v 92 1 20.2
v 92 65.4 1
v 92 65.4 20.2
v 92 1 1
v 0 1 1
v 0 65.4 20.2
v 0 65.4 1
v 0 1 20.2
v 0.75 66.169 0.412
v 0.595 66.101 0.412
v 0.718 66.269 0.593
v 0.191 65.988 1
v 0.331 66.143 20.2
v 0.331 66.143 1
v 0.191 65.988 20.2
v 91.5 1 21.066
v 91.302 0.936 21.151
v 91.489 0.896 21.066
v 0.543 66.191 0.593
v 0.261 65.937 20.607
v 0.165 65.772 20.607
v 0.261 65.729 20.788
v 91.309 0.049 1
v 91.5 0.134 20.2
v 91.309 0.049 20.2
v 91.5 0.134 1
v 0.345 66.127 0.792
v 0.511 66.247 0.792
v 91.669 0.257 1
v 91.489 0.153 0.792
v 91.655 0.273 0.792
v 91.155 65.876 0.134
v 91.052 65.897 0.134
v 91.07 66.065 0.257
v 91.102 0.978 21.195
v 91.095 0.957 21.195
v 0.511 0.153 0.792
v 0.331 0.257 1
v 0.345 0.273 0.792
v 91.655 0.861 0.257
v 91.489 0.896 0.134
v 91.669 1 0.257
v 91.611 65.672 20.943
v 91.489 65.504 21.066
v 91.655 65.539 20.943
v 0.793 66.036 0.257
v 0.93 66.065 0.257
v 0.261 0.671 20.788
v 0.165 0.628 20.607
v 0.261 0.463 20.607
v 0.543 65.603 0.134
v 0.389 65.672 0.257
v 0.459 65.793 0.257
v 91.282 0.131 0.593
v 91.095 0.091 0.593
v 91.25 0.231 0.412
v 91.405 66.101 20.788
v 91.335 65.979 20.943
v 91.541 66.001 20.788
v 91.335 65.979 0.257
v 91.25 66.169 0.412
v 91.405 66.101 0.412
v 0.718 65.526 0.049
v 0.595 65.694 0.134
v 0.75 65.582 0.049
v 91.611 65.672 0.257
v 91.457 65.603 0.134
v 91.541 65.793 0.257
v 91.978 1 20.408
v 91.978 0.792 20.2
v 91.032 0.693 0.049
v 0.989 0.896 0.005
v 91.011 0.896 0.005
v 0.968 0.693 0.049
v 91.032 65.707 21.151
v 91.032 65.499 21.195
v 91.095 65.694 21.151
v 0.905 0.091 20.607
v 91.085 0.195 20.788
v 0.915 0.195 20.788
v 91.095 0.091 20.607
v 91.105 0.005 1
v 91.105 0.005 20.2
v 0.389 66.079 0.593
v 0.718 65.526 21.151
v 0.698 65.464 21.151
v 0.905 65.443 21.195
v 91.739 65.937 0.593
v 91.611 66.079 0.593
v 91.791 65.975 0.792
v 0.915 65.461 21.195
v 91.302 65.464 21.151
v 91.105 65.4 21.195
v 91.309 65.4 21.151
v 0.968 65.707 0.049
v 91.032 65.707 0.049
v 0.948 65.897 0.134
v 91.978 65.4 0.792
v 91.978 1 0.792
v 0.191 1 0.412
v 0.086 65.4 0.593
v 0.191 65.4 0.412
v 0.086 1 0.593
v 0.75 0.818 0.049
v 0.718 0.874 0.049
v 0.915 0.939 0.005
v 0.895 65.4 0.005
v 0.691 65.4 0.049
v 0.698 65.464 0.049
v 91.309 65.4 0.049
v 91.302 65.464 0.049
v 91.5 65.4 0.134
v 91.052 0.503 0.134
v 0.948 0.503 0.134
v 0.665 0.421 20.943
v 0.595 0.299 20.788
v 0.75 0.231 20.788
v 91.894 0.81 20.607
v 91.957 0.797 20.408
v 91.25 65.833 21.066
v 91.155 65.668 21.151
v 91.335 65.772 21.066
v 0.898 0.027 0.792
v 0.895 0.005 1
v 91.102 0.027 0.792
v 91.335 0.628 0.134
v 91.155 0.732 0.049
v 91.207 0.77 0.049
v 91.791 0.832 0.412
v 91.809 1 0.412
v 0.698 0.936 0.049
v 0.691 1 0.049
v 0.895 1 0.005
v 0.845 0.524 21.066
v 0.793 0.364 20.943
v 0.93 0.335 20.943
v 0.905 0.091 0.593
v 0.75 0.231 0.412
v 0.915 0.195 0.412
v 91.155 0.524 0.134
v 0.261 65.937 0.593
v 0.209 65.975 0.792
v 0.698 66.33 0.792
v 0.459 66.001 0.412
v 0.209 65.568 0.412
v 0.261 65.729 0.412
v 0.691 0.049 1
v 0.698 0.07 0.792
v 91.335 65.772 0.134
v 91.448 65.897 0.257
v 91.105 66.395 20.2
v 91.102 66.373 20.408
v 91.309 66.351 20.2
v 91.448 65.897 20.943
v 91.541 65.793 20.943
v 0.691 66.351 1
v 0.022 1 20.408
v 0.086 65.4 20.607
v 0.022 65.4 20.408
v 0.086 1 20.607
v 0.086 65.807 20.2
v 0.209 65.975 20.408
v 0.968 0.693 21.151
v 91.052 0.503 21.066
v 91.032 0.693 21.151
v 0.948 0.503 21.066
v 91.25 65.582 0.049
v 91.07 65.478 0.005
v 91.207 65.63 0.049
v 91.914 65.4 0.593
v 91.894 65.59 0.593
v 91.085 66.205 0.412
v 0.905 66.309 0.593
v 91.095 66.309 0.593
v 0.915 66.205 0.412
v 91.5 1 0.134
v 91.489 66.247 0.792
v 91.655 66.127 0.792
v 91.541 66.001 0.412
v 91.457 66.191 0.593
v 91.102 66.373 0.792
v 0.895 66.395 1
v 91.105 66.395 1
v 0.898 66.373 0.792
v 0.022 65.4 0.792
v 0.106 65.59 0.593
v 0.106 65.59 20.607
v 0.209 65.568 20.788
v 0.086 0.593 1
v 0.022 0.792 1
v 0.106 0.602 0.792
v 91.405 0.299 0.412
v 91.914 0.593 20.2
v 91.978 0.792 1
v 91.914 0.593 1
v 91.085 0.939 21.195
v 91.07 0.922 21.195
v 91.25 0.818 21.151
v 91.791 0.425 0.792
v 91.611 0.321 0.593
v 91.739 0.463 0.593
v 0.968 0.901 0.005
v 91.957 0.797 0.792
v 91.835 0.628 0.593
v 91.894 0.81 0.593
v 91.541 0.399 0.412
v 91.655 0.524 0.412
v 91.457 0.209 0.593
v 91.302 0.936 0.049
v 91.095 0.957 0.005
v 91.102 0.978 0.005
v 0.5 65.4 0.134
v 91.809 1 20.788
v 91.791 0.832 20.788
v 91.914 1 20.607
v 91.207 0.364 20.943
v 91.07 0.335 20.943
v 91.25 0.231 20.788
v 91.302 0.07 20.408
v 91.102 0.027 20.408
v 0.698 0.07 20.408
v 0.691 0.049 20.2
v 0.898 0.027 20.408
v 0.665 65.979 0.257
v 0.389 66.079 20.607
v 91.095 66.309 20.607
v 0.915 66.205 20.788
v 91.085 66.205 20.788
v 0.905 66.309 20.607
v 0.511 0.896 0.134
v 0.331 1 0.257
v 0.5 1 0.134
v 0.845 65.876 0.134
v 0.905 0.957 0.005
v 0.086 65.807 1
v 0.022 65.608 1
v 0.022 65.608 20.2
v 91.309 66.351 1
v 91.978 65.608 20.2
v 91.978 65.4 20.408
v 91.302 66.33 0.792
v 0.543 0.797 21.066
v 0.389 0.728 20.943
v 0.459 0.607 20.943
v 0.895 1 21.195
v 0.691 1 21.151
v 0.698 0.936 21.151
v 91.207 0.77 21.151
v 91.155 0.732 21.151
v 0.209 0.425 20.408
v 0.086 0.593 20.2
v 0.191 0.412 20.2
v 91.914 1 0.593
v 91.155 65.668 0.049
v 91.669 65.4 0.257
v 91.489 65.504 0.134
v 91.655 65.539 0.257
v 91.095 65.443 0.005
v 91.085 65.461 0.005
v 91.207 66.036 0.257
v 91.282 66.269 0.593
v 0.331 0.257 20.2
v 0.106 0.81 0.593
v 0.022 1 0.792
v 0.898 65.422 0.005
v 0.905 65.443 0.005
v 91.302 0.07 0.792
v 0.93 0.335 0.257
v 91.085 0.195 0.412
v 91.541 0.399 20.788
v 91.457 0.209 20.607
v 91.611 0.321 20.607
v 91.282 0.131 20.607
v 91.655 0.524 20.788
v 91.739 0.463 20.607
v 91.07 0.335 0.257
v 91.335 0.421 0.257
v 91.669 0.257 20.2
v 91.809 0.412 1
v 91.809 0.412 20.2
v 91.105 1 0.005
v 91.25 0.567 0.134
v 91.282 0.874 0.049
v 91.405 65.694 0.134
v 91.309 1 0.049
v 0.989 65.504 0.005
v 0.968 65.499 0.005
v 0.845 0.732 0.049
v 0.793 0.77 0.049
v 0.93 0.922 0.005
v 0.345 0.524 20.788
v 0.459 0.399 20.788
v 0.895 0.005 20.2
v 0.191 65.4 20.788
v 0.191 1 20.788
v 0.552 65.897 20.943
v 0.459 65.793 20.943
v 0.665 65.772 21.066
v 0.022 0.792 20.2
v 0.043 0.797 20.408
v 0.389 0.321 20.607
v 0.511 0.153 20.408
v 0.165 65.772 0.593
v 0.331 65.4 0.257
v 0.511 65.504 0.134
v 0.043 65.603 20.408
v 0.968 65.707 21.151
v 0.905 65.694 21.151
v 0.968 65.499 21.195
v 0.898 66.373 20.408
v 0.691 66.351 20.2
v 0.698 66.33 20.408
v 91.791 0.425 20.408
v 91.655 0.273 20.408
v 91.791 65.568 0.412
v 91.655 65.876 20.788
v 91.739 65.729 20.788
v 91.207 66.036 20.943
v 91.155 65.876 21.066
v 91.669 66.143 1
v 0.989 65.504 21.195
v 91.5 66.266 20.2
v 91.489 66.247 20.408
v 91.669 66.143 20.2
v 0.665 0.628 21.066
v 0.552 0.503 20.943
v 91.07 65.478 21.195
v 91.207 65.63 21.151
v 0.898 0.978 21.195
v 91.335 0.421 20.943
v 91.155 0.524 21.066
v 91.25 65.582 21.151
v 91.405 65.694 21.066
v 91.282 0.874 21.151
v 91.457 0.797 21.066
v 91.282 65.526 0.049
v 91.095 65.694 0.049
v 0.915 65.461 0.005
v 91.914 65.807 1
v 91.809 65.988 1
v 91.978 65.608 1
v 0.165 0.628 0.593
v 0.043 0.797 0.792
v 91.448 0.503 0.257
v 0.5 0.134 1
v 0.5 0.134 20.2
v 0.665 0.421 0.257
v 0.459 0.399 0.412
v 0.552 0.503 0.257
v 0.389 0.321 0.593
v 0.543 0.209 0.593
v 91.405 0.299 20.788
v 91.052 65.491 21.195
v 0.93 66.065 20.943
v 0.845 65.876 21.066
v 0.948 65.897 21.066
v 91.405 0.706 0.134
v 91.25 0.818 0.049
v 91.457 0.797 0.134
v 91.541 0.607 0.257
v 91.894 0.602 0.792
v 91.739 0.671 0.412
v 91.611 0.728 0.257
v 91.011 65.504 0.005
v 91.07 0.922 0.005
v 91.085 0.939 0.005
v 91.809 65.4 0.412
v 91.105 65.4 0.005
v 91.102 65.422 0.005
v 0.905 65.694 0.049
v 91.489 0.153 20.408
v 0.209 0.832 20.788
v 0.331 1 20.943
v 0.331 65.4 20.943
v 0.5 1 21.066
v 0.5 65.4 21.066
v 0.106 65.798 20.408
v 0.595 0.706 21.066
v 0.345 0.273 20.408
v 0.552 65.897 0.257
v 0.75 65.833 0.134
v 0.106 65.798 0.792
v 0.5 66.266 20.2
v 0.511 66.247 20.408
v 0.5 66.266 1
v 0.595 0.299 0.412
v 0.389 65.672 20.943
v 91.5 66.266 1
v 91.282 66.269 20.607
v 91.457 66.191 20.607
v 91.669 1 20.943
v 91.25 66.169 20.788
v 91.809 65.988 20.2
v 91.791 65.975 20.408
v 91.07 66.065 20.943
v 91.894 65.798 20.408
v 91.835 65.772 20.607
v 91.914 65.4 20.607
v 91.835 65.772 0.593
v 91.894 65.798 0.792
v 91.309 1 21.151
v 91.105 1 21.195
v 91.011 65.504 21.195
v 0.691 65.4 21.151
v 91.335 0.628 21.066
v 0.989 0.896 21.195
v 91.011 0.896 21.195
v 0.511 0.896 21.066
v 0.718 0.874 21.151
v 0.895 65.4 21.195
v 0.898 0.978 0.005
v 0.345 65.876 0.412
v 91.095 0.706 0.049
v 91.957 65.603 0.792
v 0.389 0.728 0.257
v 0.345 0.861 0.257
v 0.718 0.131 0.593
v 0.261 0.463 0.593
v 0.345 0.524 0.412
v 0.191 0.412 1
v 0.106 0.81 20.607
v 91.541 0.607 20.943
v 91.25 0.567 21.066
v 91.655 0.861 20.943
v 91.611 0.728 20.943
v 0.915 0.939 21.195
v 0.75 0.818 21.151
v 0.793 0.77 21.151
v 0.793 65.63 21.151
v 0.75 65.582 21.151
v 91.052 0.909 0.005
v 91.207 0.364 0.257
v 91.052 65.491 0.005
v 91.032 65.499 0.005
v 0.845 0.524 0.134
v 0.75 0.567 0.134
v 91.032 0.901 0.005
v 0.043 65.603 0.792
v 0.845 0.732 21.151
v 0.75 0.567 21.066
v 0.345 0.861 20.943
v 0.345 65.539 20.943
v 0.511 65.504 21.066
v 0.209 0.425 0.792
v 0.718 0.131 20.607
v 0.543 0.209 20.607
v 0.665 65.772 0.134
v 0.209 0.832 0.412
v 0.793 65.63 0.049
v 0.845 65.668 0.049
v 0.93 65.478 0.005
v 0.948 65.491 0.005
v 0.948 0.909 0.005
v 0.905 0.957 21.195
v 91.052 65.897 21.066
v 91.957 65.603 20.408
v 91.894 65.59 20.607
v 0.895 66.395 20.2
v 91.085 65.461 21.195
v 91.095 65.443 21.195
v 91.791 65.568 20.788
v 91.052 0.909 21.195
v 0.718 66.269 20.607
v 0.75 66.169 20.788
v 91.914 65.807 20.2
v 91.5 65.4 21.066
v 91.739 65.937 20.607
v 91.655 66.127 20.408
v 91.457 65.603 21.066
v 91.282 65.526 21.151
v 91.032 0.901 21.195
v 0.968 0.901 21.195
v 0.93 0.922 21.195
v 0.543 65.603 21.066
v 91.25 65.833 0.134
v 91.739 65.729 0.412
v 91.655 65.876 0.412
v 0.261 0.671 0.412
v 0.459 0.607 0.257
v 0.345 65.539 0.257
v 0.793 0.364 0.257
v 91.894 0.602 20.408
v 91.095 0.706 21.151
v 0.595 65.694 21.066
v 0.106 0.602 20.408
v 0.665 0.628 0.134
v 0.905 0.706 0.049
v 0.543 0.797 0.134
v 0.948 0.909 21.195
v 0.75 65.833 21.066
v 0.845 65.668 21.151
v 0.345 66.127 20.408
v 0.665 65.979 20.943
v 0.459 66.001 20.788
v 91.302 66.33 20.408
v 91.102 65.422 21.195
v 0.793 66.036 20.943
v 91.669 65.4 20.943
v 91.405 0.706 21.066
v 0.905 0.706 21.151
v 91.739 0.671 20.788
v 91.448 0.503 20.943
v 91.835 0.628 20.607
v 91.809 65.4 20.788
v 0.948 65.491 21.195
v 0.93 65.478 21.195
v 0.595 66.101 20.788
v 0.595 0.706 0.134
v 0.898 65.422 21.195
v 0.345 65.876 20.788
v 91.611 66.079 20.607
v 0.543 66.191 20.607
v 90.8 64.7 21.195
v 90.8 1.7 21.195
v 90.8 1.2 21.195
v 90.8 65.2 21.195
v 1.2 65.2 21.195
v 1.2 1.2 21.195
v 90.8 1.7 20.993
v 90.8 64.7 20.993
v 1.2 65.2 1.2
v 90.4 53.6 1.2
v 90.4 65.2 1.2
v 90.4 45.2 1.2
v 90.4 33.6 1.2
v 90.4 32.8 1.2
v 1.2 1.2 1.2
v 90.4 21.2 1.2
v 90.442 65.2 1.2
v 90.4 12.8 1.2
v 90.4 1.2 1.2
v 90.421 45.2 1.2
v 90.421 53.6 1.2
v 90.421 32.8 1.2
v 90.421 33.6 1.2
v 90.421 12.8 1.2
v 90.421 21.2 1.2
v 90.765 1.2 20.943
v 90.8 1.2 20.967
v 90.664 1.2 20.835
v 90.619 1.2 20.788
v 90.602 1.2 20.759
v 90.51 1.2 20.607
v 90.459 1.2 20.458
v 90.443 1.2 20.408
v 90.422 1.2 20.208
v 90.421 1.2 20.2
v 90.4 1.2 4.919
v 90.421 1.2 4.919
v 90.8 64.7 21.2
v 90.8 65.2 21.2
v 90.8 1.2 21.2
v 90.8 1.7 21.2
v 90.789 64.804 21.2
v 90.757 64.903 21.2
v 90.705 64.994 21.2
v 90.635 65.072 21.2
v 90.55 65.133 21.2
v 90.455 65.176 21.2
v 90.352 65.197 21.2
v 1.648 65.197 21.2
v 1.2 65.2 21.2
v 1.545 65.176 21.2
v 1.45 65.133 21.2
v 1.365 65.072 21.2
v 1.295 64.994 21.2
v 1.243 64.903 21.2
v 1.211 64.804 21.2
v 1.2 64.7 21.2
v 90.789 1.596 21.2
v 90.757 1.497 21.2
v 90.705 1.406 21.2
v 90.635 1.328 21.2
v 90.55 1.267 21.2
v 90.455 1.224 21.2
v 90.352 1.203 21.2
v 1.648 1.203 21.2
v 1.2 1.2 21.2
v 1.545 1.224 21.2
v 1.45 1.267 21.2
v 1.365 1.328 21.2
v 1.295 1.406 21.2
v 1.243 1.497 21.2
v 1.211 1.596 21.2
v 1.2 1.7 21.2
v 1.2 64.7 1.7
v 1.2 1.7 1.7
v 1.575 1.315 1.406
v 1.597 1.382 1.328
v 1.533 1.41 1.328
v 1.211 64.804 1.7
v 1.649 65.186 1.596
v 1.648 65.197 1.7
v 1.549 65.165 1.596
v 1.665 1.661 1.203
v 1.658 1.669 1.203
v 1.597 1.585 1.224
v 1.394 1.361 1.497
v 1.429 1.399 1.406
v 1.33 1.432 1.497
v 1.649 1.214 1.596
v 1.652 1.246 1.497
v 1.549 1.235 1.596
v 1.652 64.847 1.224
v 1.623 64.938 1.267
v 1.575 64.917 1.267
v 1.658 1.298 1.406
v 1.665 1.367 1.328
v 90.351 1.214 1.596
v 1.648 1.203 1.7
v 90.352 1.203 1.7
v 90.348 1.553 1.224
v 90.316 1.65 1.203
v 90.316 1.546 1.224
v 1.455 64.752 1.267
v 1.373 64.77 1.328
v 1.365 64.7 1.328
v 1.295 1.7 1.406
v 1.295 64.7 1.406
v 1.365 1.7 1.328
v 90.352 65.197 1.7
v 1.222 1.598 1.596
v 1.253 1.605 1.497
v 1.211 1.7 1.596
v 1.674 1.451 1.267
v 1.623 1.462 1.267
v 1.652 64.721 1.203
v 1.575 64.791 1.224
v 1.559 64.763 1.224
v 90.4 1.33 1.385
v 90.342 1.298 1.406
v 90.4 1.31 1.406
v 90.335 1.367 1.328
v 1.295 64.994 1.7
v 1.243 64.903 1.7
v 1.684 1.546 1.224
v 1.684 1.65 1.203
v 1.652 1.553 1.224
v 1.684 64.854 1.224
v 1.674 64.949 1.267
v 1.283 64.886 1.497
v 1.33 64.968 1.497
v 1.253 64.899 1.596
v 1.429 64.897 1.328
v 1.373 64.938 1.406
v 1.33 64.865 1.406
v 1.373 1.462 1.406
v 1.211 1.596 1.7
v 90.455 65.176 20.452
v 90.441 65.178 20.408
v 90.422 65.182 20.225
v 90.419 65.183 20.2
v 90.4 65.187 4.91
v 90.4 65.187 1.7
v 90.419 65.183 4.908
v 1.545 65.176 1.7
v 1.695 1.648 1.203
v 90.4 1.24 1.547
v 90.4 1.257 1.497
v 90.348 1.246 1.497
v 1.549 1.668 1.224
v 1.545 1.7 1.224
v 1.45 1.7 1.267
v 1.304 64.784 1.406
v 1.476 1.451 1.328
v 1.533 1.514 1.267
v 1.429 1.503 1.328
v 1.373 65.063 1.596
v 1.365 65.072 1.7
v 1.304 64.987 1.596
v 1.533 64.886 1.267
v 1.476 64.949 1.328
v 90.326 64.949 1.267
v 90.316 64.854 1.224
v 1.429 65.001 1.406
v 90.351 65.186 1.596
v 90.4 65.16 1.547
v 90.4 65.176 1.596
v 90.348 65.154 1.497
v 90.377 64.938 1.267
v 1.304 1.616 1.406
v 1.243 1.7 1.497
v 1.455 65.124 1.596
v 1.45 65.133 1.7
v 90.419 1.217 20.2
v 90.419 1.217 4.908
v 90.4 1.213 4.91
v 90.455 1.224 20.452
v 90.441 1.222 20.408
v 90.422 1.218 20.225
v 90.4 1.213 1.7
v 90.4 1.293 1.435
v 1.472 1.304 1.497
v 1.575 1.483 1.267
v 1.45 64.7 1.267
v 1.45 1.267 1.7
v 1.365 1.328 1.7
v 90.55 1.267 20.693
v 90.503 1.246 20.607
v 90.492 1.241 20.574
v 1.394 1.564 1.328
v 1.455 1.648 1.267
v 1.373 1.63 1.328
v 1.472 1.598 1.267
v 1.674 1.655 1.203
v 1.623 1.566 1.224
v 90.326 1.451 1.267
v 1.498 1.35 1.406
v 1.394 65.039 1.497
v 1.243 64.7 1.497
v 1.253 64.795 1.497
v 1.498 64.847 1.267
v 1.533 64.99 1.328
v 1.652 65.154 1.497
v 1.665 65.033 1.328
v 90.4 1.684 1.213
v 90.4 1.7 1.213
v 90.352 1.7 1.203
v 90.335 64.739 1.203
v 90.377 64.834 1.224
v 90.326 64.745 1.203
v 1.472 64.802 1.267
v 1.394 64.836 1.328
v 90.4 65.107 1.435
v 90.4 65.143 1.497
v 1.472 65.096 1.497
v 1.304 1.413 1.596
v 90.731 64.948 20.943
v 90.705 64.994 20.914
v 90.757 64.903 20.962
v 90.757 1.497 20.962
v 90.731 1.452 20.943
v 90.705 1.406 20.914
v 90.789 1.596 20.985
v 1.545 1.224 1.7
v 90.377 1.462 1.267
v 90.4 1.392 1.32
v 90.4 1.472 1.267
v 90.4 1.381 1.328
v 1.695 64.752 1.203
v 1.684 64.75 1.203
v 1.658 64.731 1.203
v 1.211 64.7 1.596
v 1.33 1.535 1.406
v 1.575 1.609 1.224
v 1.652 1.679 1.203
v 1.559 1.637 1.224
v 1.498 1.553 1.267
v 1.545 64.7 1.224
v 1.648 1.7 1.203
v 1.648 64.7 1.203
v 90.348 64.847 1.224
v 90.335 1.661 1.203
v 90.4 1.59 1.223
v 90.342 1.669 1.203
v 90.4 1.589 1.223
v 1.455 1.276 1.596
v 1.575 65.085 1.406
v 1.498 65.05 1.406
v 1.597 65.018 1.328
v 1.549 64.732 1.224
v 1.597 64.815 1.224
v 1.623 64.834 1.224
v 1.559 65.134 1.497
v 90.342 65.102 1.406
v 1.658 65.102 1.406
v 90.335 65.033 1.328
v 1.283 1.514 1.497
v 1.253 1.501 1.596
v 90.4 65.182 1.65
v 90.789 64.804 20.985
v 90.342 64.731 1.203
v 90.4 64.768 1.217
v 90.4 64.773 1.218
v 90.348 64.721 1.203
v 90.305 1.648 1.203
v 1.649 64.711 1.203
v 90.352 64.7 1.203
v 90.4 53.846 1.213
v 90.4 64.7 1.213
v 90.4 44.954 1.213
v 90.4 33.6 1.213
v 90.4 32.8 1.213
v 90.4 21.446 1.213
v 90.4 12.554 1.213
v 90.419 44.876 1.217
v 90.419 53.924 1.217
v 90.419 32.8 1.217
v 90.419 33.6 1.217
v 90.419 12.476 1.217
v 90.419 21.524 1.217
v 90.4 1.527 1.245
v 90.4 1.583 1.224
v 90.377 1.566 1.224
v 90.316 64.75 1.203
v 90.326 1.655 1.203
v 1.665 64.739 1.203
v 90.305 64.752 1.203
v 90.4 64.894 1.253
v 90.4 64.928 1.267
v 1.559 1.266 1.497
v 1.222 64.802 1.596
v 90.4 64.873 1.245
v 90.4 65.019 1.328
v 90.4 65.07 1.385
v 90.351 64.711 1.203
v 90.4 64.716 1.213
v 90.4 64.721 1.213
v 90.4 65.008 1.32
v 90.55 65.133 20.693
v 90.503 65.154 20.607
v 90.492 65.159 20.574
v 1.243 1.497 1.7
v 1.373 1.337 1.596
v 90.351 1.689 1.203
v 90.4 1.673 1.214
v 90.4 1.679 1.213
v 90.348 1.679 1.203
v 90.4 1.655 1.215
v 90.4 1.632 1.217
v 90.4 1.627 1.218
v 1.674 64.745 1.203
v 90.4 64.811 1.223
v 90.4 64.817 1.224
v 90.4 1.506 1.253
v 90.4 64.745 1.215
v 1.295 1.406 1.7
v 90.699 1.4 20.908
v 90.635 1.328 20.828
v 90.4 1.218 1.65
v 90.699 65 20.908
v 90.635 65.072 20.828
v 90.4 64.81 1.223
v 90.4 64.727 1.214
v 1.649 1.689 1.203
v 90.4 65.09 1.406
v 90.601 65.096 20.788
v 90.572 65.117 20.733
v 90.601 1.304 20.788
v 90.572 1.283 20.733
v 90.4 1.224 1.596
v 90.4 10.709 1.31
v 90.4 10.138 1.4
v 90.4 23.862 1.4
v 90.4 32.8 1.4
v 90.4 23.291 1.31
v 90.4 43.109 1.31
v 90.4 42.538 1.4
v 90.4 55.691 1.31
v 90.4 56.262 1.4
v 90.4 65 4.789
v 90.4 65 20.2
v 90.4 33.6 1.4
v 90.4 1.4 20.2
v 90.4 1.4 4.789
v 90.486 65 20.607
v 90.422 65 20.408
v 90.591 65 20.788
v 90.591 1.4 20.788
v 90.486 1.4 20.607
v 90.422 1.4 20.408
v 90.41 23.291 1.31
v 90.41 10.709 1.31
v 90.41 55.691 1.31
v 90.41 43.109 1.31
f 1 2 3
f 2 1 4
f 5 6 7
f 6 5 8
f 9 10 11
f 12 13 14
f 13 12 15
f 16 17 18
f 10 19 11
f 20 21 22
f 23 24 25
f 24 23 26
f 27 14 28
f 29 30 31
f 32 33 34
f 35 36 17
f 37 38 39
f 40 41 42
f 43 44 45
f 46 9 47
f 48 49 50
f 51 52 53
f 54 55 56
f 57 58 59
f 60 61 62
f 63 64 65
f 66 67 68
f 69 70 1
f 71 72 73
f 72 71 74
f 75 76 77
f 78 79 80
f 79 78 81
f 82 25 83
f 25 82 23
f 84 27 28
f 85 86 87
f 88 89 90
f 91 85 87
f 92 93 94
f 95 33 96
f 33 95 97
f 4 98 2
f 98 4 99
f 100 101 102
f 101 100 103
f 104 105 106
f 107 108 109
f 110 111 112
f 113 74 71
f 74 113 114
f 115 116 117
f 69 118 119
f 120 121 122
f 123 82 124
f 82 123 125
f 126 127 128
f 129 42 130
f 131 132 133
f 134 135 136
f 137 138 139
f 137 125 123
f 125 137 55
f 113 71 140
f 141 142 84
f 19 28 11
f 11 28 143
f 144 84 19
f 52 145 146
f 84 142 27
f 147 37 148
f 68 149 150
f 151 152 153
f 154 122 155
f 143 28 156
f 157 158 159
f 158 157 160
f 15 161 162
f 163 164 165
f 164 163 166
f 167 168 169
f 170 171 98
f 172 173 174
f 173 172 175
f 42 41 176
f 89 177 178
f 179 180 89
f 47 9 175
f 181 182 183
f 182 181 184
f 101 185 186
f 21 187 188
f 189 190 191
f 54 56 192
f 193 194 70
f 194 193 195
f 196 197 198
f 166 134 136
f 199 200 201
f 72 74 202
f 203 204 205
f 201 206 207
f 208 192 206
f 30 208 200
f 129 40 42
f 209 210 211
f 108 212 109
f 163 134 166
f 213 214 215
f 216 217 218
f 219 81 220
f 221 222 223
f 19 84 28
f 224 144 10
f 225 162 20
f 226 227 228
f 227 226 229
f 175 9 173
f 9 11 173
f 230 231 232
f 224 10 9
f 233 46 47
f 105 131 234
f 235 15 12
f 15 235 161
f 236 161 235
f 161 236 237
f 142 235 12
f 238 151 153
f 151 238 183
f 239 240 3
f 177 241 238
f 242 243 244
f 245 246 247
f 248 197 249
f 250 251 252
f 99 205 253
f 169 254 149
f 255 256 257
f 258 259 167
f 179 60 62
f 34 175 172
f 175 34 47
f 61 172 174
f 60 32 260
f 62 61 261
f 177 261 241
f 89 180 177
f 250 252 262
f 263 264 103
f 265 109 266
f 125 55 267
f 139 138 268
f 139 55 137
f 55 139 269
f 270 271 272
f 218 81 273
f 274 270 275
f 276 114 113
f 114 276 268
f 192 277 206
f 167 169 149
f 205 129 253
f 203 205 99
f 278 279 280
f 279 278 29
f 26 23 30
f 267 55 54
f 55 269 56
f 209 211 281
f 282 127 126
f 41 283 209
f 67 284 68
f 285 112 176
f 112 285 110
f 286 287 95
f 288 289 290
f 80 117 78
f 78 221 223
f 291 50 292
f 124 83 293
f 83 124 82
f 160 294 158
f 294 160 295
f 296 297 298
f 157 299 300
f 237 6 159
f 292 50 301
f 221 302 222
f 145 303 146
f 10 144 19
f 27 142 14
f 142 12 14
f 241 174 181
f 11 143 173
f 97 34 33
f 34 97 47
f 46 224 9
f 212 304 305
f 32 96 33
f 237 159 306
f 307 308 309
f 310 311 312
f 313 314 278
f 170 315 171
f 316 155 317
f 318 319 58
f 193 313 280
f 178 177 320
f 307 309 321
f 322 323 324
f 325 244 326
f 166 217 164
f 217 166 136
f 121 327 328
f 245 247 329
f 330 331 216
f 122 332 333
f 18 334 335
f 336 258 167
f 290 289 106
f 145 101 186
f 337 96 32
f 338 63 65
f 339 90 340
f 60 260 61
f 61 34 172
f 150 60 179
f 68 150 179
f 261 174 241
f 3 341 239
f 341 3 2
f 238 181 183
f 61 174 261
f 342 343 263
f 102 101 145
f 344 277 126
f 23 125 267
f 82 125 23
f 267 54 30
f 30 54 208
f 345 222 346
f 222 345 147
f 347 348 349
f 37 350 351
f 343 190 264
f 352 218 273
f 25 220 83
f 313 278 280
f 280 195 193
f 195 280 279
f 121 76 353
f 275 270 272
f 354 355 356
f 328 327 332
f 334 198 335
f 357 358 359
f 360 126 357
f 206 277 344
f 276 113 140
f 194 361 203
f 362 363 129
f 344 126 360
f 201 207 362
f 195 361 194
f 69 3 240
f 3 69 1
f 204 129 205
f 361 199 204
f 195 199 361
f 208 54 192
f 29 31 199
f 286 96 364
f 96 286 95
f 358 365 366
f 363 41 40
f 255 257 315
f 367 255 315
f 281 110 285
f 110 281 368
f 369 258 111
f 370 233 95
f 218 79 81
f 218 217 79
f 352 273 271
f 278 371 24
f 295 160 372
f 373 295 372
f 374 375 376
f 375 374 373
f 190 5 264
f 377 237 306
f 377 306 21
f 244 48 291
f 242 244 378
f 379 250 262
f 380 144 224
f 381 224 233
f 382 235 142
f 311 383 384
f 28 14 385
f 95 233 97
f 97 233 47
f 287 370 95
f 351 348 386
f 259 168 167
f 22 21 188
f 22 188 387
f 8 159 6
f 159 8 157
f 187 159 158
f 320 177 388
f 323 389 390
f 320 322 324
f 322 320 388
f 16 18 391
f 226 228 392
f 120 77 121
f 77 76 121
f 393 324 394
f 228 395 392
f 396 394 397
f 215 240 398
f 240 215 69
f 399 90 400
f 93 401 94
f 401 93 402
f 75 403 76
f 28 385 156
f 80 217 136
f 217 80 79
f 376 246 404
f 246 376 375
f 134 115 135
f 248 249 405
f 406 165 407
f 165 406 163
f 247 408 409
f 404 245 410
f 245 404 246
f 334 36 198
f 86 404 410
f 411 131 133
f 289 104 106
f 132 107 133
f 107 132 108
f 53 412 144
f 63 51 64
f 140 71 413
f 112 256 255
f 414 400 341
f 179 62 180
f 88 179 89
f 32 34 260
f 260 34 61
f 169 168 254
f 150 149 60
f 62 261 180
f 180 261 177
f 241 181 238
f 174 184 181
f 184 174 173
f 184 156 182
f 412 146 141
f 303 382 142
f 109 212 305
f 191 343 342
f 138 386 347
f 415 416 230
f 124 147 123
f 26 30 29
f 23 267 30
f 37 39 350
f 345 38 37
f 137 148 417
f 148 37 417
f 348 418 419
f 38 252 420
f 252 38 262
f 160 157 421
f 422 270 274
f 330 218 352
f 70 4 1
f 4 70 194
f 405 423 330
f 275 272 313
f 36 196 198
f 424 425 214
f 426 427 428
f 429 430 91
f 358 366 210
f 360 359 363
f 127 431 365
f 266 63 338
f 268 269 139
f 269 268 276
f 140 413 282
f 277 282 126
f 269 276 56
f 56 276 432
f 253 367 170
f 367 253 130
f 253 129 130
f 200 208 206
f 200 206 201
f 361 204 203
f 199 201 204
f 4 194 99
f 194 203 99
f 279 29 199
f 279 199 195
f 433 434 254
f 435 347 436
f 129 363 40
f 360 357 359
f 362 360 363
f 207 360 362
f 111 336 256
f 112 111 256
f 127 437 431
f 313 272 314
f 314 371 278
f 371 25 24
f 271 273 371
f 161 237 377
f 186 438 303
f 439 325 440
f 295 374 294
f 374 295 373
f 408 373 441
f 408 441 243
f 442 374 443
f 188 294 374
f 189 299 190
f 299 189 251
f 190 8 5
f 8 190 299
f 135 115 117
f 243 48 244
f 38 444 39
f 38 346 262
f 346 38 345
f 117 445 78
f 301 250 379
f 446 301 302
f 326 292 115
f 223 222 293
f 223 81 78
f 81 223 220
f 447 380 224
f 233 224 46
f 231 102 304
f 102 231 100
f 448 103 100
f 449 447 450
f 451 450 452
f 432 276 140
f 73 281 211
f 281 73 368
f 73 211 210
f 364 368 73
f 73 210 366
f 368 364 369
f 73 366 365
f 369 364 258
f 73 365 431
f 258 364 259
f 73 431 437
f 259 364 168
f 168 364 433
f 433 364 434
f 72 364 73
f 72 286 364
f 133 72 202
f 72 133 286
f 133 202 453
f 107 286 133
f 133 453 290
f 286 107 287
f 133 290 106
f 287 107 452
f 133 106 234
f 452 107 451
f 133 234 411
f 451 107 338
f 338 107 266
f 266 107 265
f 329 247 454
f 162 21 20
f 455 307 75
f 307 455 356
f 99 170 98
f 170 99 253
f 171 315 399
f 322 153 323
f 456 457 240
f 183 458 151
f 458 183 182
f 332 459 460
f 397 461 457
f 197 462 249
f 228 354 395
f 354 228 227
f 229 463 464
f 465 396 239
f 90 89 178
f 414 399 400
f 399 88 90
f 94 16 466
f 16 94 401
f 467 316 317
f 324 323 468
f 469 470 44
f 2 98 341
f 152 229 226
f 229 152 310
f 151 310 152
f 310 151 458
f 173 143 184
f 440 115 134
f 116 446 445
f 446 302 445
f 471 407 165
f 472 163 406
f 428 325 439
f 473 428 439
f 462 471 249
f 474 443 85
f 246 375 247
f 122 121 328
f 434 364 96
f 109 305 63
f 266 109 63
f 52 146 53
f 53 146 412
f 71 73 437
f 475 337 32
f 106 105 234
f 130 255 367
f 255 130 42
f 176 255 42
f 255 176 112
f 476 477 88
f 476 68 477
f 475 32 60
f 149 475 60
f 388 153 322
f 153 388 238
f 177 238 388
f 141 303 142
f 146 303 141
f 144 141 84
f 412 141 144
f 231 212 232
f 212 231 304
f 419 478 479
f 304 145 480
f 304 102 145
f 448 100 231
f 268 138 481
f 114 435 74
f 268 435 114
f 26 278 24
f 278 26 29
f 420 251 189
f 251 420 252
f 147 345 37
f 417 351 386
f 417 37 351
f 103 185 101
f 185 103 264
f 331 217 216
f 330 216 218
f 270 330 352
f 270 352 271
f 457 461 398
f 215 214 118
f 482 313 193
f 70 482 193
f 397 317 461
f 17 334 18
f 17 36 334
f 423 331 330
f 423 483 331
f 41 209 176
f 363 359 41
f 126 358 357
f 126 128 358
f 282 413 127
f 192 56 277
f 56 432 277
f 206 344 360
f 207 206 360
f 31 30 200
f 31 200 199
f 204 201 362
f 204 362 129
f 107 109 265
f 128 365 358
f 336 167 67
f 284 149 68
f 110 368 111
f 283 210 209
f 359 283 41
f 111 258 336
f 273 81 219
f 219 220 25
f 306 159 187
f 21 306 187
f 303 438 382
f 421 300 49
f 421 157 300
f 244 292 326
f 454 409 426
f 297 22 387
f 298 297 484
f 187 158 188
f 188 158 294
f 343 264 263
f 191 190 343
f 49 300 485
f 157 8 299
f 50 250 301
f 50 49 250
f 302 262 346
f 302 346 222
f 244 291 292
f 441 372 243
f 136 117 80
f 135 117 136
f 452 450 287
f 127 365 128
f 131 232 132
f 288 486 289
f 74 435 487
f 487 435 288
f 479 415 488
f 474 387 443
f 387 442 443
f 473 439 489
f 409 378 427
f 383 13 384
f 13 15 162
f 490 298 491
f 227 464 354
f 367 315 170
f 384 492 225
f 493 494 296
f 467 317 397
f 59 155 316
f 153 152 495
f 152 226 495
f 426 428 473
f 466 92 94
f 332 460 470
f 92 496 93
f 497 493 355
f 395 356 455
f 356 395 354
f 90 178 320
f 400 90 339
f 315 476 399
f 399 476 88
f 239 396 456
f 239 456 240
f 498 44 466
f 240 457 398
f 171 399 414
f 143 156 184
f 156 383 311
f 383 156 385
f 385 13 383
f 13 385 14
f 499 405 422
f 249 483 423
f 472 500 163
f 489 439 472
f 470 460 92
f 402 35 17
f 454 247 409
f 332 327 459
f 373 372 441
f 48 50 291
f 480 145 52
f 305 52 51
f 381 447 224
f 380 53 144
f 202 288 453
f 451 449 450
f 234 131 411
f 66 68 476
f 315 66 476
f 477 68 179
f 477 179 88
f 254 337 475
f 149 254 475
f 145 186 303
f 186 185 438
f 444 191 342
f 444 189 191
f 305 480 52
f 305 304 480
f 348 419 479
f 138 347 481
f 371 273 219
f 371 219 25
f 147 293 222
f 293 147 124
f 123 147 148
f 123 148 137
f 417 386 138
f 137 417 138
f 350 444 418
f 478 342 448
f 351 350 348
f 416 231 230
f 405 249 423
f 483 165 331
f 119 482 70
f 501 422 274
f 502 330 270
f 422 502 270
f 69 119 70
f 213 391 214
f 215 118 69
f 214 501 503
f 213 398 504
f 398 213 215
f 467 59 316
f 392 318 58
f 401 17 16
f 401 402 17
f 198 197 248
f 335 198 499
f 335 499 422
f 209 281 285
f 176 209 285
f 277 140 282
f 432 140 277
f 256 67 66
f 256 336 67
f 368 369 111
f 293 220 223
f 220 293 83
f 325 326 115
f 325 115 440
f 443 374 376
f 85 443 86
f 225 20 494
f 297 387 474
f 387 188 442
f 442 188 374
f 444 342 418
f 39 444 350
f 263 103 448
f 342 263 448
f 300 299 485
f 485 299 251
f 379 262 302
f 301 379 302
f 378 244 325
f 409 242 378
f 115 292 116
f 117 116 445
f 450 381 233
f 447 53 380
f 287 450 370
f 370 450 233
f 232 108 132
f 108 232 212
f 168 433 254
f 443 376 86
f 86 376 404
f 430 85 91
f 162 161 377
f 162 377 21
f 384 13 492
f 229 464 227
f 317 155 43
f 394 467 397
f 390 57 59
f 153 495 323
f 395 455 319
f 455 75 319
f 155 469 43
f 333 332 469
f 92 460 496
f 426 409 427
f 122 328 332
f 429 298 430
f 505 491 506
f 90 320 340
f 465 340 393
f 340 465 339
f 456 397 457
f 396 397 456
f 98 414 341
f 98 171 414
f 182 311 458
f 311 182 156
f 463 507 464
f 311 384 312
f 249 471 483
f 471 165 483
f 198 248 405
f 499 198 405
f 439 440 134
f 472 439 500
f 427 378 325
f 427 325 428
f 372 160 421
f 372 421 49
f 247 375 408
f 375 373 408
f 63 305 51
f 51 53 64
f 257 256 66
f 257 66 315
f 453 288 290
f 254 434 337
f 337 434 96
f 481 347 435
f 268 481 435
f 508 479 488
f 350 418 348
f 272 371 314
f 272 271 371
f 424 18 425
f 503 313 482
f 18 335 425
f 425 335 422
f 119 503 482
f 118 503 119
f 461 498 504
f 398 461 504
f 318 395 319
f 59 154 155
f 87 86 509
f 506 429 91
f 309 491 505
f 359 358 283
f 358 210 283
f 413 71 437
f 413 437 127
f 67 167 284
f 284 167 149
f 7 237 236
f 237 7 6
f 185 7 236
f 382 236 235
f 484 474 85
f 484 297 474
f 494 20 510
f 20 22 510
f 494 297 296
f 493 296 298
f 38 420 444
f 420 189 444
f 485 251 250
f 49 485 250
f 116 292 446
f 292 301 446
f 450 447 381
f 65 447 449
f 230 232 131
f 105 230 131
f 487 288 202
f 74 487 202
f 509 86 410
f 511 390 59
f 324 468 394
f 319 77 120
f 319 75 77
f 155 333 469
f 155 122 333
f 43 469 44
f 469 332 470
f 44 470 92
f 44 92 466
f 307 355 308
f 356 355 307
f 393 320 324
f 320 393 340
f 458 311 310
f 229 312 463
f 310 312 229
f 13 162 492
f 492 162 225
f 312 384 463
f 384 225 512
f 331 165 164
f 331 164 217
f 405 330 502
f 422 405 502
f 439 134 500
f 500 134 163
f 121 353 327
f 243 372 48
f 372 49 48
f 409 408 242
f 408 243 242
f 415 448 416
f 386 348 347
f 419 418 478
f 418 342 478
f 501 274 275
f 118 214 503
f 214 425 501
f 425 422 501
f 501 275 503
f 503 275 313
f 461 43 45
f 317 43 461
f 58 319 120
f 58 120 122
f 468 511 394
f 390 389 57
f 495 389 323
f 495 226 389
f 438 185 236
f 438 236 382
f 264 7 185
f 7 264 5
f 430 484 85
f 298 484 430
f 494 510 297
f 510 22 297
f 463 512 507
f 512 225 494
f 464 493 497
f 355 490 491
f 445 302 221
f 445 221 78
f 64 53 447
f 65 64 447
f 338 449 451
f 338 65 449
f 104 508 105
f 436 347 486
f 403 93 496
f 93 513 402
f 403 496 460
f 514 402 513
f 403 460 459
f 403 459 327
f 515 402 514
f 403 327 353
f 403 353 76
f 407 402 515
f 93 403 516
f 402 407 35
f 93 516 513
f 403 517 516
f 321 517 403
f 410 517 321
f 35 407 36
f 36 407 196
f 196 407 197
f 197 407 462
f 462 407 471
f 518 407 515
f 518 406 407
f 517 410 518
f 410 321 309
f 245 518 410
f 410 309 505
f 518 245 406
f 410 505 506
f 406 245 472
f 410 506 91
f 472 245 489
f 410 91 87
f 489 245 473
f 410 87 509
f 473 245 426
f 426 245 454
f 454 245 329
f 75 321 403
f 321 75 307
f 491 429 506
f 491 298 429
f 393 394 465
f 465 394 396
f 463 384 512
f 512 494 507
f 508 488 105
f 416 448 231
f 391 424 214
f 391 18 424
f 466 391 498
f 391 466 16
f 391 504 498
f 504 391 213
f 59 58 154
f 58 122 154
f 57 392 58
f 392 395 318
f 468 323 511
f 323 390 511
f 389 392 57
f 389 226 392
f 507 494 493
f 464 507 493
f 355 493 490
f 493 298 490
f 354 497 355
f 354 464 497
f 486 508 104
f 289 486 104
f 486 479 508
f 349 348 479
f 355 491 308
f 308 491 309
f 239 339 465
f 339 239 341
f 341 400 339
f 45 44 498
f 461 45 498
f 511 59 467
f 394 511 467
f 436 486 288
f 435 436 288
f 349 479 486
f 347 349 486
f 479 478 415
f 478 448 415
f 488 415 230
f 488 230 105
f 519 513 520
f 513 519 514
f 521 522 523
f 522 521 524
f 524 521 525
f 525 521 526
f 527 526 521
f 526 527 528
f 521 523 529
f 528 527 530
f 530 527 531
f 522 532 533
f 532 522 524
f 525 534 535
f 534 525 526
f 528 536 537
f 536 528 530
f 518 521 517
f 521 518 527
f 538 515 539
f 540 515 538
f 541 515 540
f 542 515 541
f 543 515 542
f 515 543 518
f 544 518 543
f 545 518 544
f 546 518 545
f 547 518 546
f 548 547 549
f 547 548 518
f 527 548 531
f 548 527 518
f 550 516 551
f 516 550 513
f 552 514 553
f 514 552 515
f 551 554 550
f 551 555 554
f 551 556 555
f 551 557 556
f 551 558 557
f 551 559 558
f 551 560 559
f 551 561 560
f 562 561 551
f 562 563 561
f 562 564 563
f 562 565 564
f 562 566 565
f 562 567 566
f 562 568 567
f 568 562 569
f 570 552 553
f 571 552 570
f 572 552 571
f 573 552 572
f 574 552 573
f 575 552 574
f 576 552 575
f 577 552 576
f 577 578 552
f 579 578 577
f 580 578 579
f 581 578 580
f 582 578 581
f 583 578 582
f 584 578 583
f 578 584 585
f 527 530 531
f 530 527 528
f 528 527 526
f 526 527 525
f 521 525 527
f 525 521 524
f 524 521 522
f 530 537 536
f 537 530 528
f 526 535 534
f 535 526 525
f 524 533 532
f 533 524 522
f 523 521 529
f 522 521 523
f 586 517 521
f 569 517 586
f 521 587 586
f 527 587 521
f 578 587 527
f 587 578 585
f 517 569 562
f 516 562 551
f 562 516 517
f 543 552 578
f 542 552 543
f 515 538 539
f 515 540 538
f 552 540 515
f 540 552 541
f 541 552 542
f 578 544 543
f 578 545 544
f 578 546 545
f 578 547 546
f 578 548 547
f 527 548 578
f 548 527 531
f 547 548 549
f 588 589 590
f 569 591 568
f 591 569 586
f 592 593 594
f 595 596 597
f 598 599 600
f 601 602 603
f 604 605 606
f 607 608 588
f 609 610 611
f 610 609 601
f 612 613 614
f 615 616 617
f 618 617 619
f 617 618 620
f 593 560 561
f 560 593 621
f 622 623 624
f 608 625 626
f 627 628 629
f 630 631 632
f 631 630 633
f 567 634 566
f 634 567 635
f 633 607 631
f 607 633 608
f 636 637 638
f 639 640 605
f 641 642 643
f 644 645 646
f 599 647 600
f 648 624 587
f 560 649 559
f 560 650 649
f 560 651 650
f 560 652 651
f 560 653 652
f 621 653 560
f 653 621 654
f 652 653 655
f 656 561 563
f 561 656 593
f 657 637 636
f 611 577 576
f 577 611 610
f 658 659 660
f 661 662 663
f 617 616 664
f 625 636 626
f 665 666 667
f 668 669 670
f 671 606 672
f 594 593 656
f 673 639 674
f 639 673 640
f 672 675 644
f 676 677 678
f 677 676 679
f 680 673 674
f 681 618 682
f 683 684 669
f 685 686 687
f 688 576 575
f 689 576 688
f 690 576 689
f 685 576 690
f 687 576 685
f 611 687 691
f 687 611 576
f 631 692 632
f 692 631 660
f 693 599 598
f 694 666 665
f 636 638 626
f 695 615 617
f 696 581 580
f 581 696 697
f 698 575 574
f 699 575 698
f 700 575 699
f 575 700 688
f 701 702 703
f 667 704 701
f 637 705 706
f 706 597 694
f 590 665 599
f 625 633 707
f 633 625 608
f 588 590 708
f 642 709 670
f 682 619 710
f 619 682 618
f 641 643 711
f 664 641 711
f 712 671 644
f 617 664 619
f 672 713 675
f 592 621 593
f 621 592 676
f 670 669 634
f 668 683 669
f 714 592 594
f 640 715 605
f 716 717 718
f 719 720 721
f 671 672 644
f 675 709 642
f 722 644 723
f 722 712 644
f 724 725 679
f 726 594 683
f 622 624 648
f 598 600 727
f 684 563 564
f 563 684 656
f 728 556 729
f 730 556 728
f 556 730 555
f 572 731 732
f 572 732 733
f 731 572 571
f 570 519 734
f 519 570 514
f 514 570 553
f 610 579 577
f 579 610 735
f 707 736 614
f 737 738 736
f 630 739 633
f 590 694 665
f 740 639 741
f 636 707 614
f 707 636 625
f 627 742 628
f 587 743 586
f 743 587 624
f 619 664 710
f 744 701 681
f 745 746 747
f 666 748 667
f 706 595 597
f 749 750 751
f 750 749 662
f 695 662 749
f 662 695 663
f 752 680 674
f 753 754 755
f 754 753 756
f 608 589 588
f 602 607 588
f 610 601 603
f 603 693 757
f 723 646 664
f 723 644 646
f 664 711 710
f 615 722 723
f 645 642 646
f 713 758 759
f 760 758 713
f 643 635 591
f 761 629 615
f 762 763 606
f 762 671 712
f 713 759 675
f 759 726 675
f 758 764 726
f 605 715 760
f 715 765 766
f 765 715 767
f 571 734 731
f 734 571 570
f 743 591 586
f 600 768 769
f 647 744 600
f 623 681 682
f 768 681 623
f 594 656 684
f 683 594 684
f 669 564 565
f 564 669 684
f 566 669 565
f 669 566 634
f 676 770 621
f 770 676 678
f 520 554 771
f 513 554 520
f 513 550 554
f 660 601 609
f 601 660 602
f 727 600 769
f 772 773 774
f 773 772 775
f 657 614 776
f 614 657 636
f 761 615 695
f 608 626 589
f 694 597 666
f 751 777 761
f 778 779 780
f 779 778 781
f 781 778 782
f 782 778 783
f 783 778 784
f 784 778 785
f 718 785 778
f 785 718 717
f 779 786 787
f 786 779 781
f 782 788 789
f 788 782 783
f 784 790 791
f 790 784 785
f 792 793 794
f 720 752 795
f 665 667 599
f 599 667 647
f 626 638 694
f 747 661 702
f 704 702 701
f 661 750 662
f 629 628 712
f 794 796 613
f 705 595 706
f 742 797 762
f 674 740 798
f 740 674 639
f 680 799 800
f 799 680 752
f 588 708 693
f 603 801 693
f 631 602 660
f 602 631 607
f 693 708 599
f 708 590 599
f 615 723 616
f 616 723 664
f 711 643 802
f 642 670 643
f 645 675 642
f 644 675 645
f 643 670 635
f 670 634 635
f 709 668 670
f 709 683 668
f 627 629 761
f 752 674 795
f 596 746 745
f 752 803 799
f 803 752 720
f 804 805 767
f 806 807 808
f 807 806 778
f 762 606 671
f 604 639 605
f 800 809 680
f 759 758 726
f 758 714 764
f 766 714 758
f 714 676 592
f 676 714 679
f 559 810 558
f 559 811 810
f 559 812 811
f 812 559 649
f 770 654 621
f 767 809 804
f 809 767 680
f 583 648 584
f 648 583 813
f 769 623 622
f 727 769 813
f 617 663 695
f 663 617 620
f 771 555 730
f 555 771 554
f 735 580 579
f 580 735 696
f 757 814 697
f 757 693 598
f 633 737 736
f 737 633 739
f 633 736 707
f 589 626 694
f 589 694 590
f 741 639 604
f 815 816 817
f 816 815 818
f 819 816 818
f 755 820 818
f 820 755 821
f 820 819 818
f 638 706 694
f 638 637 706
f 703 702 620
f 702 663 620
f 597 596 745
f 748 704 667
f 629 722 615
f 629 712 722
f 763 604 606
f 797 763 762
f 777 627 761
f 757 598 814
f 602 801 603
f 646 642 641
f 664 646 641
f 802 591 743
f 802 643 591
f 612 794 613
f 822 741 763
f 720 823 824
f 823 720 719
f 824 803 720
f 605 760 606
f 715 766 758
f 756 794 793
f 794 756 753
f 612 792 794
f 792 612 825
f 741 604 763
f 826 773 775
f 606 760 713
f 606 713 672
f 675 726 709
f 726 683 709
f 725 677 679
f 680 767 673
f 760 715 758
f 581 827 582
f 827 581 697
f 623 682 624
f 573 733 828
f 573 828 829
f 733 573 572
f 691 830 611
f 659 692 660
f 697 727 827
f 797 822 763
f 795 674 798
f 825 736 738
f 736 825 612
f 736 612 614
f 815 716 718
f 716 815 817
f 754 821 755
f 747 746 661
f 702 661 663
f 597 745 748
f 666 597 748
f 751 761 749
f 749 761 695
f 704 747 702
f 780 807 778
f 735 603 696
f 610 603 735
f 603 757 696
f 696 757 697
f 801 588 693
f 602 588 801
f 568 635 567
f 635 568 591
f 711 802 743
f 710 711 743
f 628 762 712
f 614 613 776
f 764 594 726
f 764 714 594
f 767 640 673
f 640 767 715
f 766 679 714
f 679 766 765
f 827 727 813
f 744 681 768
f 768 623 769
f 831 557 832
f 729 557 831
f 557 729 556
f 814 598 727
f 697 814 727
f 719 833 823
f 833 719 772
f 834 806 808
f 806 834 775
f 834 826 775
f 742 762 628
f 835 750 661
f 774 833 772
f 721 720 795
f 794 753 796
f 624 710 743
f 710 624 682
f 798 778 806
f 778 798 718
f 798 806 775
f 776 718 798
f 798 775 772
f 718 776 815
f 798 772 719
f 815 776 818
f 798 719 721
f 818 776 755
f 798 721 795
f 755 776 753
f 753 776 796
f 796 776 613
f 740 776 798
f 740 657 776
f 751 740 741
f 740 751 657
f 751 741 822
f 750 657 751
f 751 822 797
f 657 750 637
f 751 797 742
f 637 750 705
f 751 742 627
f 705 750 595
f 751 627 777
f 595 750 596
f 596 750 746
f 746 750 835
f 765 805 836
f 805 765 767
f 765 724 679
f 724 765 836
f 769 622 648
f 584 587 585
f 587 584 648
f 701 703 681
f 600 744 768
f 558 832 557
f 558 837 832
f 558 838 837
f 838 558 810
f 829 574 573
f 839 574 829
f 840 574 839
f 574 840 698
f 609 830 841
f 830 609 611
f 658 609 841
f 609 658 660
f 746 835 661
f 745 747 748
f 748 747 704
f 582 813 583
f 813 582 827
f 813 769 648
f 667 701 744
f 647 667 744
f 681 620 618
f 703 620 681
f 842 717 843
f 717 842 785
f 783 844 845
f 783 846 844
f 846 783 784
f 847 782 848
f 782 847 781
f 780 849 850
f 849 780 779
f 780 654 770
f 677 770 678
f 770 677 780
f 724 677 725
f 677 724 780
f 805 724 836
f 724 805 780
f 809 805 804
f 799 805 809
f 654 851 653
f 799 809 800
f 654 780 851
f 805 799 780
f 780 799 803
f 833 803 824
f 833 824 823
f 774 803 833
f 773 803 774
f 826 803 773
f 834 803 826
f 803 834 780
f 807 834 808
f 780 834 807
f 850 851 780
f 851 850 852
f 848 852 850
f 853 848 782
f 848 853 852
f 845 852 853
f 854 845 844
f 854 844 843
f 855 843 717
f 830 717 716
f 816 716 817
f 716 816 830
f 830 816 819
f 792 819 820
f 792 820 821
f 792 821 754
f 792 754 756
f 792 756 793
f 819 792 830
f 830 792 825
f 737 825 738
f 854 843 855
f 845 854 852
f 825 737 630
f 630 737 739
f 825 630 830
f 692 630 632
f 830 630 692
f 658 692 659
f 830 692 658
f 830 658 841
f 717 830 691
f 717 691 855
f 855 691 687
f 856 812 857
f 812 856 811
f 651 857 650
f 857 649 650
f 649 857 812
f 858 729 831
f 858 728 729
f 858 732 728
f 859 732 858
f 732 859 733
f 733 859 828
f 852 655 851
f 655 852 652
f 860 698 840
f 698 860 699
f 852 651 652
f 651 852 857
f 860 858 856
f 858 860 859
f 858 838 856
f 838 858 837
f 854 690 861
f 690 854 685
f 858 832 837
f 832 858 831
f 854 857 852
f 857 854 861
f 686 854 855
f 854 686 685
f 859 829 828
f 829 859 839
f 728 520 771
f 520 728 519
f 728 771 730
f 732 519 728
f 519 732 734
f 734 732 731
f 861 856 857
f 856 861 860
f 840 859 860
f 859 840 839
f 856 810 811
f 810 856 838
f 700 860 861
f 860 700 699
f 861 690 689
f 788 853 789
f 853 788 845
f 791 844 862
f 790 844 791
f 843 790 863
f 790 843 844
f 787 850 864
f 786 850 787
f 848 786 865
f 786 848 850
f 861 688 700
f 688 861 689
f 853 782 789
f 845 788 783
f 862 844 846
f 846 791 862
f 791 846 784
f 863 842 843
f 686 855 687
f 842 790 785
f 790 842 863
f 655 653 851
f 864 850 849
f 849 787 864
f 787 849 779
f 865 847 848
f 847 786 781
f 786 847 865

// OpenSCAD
// Download both files into the same directory and make a copy of this template for each project. Adjust the variables and values as needed to override the defaults in this file as needed. In this way you can replace the `Ultimate_Box_Generator.scad` file with a new version without having to track and restore your changes.

// If you want to use any framework variables in calulations you must import them here. If you want to also change the variable you must use a second line below to do that.
//wall=wall;
//internal_wall=internal_wall;

// Include the framework. You can change the prefix to load from a shared path.
include    <Ultimate_Box_Generator.scad>;

// At this point you can start to adjust builtin varaibles and create your own. There are also some examples of more complex boxes at the end of the file.


// Parts to render. To do more complex opperations disable these and manually call make_box() and make_lid() instead.
show_box=false;	// Whether or not to render the box
show_lid=false;	// Whether or not to render the lid. To make open boxes with no lid set `show_lid=false` and `lid_type=5`.
lid_type=0; 

// General Settings
// comp_size_deep = 18; // Depth of compartments
// comp_size_x = 32;	 // Size of compartments, X
// comp_size_y = 24.6;	 // Size of compartments, Y
wall = 1.2;		    // Width of wall, see `internal_wall` below for alternate inner wall size.
internal_wall=0.8;
// repeat_x = 3;		// Number of compartments, X
// repeat_y = 2;		// Number of compartments, Y
//tolerance=.15;      // Tolerance around lid.  If it's too tight, increase this. If it's too loose, decrease it.

// Box Rounding
box_corner_radius=1; // Add a rounding affect to the corners of the box. Anything over `wall` will cause structure and lid problems.
internal_corner_radius=.5; // Add a rounding affect to the inside.
//mesh_corner_radius=0; // Leave a radius around each corner of the mesh. May hep with bridges.
//corner_fn=30;

// Supress individual walls.
//supress_walls_x=[]; // These are the walls running along the X axis. It should be an array of size [repeat_y-1][repeat_x].
//supress_walls_y=[]; // These are the walls running along the Y axis. It should be an array of size [repeat_x-1][repeat_y].
// Example for repeat_x=4, repeat_y=3:
//supress_walls_x=[[1,1]];
//supress_walls_y=[[1,0,1],[0,1,1],[1,1,1]];
//supress_sides=false; // [X, Y, X, Y] Cutout/supress some sides. this may behave baddly with compartments or mesh.
//supress_sides_radius=wall; // Add a rounding to the cutout.
//supress_sides_offset=0; // 0, wall, [X, Y, Z] adjsut the coutout in all directions. + to grow, - so shrink
//supress_sides_fn=30;

//Internal Structure (You may need to turn off `mesh_do_sides` or `mesh_do_bottom` for good results.)
// You can also use `make_wall()` to manually add your own walls.
// 1: Rounded bottom frame.
// 2: Hexagon bottom frame. (To make this shape perfect set `comp_size_deep` to the width between to edges of the tile and set `comp_size_x` or `comp_size_y` to this this: `comp_size_deep / sqrt(3)*2`.
// 3: Rough bottom to make bits sit unevenly. (Partial)
// 4: Vertical rounding on corner. Set `internal_size_deep` to `comp_size_deep` and `internal_size_circle` to the shortest `comp_size` for a circle.
// 5: Vertical hexegon. Results may varry.
//internal_type=0; // Internal structure, see above.
//internal_rotate=false; // On lid axis or rotate to opposite.
//internal_size_deep=comp_size_deep/2; // How far into the box to start the internal structure. Should be `comp_size_deep/2` for type 1-2, `wall` for 3, or comp_size_deep for type 4-5.
//internal_size_circle=internal_type==1 ? internal_size_deep : internal_size_deep * 2 / sqrt(3); // Use this calculation, or the shorter comp_size for type 4-5.
//internal_fn=internal_type==1 || internal_type==4 ? 60 : 6; // Complexity of internal curves, may need to increase for larger or smoother curves.
//internal_wall=wall; // Custom size for internal walls.


// Complex Structure
//make_complex_box=false; // Use an array of objects from `complex_box` to create many smaller boxes within the larger box.
//internal_grow_down=true; // If set compartments will be extruded into the larger box from the top to make a flush surface. (May make a model that uses a lot of material.
//internal_empty_bottom=false; // If set the area blow each box will be empty. This will not be printable on a FDM printer unless supports are included internally but still may save material and print time.



// In addition you can set `show_box=false;` and then call `make_box()` manually to join and remove more structure to it like in this example.
/*show_box=false;
difference() {
    make_box();
    translate([0, comp_size_y/2 + wall, 0])
    rotate([0, 90, 0])
    cylinder(comp_size_x +wall*2, 10, 10);
}*/

// You can also use calls to `make_internal_box` to create more complex boxes within a larger box that share a single lid.
/*show_box=false;
make_box();
intersection() {     
    faction_x=10; faction_y=comp_size_y; faction_z=5; faction_repeat_x=3; faction_repeat_y=1;
    faction_size_x=calc_size(faction_repeat_x, faction_x, wall=internal_wall, internal_wall=internal_wall);
faction_size_y=calc_size(faction_repeat_y, faction_y, wall=internal_wall, internal_wall=internal_wall);
    
    translate([wall, wall, wall])
    cube([faction_size_x - wall, faction_size_y - wall*2, comp_size_deep]);
            
    translate([wall-internal_wall, wall-internal_wall, wall-internal_wall])
    union() {
        translate([0, 0, 0])
        make_internal_box(faction_x, faction_y, faction_z, wall=internal_wall, repeat_x=faction_repeat_x, repeat_y=faction_repeat_y);
    }
}*/

// This exmaple wil make a complex series of boxes in a larger container. The object's can be used to position other oebjects and create internal structure.
comp_size_x = 92-(2*1.2); // external size add 2*wall to this
comp_size_y = 64;    // external width add 2*wall to this
comp_size_deep = 20; // external height add 2*wall to thist

// internal_wall=0.8;
// make the external box with no internal curves
make_box(internal_type=0);
internal_type=1;
internal_size_deep=comp_size_deep  ;
comp2=make_object( x=32.2, y=31.6, z=20, offset_x=90, offset_y=0, repeat_x=3, repeat_y=2, color="Blue");

complex_box=[
   comp2   
];// make the internal compartments
make_complex_box();

// Add block under the pot: 1.2mm smaller all around, 0.5mm deep
// color("red") translate([wall, wall, -0.5]) cube([comp_size_x, comp_size_y, 0.5]);

// Some notes on complex prints:
/* OpenSCAD experience is required to do pretty much any type of customization or complex opperations. This will essentialy just make the containers within one larger object with a single lid. Alternatly multiple boxes could be created and joined together with translations to make a larger object with multiple lids. 
   Due to how variables are passed in OpenSCAD it can be tricky to get the parameters set on the parent box and child boxes as you want. It is best to use global variable assignmets to set the child box parameters, then pass overrides to the `make_box()` call yourself. (You have to set `show_box=false;` if you do this.)
  */
